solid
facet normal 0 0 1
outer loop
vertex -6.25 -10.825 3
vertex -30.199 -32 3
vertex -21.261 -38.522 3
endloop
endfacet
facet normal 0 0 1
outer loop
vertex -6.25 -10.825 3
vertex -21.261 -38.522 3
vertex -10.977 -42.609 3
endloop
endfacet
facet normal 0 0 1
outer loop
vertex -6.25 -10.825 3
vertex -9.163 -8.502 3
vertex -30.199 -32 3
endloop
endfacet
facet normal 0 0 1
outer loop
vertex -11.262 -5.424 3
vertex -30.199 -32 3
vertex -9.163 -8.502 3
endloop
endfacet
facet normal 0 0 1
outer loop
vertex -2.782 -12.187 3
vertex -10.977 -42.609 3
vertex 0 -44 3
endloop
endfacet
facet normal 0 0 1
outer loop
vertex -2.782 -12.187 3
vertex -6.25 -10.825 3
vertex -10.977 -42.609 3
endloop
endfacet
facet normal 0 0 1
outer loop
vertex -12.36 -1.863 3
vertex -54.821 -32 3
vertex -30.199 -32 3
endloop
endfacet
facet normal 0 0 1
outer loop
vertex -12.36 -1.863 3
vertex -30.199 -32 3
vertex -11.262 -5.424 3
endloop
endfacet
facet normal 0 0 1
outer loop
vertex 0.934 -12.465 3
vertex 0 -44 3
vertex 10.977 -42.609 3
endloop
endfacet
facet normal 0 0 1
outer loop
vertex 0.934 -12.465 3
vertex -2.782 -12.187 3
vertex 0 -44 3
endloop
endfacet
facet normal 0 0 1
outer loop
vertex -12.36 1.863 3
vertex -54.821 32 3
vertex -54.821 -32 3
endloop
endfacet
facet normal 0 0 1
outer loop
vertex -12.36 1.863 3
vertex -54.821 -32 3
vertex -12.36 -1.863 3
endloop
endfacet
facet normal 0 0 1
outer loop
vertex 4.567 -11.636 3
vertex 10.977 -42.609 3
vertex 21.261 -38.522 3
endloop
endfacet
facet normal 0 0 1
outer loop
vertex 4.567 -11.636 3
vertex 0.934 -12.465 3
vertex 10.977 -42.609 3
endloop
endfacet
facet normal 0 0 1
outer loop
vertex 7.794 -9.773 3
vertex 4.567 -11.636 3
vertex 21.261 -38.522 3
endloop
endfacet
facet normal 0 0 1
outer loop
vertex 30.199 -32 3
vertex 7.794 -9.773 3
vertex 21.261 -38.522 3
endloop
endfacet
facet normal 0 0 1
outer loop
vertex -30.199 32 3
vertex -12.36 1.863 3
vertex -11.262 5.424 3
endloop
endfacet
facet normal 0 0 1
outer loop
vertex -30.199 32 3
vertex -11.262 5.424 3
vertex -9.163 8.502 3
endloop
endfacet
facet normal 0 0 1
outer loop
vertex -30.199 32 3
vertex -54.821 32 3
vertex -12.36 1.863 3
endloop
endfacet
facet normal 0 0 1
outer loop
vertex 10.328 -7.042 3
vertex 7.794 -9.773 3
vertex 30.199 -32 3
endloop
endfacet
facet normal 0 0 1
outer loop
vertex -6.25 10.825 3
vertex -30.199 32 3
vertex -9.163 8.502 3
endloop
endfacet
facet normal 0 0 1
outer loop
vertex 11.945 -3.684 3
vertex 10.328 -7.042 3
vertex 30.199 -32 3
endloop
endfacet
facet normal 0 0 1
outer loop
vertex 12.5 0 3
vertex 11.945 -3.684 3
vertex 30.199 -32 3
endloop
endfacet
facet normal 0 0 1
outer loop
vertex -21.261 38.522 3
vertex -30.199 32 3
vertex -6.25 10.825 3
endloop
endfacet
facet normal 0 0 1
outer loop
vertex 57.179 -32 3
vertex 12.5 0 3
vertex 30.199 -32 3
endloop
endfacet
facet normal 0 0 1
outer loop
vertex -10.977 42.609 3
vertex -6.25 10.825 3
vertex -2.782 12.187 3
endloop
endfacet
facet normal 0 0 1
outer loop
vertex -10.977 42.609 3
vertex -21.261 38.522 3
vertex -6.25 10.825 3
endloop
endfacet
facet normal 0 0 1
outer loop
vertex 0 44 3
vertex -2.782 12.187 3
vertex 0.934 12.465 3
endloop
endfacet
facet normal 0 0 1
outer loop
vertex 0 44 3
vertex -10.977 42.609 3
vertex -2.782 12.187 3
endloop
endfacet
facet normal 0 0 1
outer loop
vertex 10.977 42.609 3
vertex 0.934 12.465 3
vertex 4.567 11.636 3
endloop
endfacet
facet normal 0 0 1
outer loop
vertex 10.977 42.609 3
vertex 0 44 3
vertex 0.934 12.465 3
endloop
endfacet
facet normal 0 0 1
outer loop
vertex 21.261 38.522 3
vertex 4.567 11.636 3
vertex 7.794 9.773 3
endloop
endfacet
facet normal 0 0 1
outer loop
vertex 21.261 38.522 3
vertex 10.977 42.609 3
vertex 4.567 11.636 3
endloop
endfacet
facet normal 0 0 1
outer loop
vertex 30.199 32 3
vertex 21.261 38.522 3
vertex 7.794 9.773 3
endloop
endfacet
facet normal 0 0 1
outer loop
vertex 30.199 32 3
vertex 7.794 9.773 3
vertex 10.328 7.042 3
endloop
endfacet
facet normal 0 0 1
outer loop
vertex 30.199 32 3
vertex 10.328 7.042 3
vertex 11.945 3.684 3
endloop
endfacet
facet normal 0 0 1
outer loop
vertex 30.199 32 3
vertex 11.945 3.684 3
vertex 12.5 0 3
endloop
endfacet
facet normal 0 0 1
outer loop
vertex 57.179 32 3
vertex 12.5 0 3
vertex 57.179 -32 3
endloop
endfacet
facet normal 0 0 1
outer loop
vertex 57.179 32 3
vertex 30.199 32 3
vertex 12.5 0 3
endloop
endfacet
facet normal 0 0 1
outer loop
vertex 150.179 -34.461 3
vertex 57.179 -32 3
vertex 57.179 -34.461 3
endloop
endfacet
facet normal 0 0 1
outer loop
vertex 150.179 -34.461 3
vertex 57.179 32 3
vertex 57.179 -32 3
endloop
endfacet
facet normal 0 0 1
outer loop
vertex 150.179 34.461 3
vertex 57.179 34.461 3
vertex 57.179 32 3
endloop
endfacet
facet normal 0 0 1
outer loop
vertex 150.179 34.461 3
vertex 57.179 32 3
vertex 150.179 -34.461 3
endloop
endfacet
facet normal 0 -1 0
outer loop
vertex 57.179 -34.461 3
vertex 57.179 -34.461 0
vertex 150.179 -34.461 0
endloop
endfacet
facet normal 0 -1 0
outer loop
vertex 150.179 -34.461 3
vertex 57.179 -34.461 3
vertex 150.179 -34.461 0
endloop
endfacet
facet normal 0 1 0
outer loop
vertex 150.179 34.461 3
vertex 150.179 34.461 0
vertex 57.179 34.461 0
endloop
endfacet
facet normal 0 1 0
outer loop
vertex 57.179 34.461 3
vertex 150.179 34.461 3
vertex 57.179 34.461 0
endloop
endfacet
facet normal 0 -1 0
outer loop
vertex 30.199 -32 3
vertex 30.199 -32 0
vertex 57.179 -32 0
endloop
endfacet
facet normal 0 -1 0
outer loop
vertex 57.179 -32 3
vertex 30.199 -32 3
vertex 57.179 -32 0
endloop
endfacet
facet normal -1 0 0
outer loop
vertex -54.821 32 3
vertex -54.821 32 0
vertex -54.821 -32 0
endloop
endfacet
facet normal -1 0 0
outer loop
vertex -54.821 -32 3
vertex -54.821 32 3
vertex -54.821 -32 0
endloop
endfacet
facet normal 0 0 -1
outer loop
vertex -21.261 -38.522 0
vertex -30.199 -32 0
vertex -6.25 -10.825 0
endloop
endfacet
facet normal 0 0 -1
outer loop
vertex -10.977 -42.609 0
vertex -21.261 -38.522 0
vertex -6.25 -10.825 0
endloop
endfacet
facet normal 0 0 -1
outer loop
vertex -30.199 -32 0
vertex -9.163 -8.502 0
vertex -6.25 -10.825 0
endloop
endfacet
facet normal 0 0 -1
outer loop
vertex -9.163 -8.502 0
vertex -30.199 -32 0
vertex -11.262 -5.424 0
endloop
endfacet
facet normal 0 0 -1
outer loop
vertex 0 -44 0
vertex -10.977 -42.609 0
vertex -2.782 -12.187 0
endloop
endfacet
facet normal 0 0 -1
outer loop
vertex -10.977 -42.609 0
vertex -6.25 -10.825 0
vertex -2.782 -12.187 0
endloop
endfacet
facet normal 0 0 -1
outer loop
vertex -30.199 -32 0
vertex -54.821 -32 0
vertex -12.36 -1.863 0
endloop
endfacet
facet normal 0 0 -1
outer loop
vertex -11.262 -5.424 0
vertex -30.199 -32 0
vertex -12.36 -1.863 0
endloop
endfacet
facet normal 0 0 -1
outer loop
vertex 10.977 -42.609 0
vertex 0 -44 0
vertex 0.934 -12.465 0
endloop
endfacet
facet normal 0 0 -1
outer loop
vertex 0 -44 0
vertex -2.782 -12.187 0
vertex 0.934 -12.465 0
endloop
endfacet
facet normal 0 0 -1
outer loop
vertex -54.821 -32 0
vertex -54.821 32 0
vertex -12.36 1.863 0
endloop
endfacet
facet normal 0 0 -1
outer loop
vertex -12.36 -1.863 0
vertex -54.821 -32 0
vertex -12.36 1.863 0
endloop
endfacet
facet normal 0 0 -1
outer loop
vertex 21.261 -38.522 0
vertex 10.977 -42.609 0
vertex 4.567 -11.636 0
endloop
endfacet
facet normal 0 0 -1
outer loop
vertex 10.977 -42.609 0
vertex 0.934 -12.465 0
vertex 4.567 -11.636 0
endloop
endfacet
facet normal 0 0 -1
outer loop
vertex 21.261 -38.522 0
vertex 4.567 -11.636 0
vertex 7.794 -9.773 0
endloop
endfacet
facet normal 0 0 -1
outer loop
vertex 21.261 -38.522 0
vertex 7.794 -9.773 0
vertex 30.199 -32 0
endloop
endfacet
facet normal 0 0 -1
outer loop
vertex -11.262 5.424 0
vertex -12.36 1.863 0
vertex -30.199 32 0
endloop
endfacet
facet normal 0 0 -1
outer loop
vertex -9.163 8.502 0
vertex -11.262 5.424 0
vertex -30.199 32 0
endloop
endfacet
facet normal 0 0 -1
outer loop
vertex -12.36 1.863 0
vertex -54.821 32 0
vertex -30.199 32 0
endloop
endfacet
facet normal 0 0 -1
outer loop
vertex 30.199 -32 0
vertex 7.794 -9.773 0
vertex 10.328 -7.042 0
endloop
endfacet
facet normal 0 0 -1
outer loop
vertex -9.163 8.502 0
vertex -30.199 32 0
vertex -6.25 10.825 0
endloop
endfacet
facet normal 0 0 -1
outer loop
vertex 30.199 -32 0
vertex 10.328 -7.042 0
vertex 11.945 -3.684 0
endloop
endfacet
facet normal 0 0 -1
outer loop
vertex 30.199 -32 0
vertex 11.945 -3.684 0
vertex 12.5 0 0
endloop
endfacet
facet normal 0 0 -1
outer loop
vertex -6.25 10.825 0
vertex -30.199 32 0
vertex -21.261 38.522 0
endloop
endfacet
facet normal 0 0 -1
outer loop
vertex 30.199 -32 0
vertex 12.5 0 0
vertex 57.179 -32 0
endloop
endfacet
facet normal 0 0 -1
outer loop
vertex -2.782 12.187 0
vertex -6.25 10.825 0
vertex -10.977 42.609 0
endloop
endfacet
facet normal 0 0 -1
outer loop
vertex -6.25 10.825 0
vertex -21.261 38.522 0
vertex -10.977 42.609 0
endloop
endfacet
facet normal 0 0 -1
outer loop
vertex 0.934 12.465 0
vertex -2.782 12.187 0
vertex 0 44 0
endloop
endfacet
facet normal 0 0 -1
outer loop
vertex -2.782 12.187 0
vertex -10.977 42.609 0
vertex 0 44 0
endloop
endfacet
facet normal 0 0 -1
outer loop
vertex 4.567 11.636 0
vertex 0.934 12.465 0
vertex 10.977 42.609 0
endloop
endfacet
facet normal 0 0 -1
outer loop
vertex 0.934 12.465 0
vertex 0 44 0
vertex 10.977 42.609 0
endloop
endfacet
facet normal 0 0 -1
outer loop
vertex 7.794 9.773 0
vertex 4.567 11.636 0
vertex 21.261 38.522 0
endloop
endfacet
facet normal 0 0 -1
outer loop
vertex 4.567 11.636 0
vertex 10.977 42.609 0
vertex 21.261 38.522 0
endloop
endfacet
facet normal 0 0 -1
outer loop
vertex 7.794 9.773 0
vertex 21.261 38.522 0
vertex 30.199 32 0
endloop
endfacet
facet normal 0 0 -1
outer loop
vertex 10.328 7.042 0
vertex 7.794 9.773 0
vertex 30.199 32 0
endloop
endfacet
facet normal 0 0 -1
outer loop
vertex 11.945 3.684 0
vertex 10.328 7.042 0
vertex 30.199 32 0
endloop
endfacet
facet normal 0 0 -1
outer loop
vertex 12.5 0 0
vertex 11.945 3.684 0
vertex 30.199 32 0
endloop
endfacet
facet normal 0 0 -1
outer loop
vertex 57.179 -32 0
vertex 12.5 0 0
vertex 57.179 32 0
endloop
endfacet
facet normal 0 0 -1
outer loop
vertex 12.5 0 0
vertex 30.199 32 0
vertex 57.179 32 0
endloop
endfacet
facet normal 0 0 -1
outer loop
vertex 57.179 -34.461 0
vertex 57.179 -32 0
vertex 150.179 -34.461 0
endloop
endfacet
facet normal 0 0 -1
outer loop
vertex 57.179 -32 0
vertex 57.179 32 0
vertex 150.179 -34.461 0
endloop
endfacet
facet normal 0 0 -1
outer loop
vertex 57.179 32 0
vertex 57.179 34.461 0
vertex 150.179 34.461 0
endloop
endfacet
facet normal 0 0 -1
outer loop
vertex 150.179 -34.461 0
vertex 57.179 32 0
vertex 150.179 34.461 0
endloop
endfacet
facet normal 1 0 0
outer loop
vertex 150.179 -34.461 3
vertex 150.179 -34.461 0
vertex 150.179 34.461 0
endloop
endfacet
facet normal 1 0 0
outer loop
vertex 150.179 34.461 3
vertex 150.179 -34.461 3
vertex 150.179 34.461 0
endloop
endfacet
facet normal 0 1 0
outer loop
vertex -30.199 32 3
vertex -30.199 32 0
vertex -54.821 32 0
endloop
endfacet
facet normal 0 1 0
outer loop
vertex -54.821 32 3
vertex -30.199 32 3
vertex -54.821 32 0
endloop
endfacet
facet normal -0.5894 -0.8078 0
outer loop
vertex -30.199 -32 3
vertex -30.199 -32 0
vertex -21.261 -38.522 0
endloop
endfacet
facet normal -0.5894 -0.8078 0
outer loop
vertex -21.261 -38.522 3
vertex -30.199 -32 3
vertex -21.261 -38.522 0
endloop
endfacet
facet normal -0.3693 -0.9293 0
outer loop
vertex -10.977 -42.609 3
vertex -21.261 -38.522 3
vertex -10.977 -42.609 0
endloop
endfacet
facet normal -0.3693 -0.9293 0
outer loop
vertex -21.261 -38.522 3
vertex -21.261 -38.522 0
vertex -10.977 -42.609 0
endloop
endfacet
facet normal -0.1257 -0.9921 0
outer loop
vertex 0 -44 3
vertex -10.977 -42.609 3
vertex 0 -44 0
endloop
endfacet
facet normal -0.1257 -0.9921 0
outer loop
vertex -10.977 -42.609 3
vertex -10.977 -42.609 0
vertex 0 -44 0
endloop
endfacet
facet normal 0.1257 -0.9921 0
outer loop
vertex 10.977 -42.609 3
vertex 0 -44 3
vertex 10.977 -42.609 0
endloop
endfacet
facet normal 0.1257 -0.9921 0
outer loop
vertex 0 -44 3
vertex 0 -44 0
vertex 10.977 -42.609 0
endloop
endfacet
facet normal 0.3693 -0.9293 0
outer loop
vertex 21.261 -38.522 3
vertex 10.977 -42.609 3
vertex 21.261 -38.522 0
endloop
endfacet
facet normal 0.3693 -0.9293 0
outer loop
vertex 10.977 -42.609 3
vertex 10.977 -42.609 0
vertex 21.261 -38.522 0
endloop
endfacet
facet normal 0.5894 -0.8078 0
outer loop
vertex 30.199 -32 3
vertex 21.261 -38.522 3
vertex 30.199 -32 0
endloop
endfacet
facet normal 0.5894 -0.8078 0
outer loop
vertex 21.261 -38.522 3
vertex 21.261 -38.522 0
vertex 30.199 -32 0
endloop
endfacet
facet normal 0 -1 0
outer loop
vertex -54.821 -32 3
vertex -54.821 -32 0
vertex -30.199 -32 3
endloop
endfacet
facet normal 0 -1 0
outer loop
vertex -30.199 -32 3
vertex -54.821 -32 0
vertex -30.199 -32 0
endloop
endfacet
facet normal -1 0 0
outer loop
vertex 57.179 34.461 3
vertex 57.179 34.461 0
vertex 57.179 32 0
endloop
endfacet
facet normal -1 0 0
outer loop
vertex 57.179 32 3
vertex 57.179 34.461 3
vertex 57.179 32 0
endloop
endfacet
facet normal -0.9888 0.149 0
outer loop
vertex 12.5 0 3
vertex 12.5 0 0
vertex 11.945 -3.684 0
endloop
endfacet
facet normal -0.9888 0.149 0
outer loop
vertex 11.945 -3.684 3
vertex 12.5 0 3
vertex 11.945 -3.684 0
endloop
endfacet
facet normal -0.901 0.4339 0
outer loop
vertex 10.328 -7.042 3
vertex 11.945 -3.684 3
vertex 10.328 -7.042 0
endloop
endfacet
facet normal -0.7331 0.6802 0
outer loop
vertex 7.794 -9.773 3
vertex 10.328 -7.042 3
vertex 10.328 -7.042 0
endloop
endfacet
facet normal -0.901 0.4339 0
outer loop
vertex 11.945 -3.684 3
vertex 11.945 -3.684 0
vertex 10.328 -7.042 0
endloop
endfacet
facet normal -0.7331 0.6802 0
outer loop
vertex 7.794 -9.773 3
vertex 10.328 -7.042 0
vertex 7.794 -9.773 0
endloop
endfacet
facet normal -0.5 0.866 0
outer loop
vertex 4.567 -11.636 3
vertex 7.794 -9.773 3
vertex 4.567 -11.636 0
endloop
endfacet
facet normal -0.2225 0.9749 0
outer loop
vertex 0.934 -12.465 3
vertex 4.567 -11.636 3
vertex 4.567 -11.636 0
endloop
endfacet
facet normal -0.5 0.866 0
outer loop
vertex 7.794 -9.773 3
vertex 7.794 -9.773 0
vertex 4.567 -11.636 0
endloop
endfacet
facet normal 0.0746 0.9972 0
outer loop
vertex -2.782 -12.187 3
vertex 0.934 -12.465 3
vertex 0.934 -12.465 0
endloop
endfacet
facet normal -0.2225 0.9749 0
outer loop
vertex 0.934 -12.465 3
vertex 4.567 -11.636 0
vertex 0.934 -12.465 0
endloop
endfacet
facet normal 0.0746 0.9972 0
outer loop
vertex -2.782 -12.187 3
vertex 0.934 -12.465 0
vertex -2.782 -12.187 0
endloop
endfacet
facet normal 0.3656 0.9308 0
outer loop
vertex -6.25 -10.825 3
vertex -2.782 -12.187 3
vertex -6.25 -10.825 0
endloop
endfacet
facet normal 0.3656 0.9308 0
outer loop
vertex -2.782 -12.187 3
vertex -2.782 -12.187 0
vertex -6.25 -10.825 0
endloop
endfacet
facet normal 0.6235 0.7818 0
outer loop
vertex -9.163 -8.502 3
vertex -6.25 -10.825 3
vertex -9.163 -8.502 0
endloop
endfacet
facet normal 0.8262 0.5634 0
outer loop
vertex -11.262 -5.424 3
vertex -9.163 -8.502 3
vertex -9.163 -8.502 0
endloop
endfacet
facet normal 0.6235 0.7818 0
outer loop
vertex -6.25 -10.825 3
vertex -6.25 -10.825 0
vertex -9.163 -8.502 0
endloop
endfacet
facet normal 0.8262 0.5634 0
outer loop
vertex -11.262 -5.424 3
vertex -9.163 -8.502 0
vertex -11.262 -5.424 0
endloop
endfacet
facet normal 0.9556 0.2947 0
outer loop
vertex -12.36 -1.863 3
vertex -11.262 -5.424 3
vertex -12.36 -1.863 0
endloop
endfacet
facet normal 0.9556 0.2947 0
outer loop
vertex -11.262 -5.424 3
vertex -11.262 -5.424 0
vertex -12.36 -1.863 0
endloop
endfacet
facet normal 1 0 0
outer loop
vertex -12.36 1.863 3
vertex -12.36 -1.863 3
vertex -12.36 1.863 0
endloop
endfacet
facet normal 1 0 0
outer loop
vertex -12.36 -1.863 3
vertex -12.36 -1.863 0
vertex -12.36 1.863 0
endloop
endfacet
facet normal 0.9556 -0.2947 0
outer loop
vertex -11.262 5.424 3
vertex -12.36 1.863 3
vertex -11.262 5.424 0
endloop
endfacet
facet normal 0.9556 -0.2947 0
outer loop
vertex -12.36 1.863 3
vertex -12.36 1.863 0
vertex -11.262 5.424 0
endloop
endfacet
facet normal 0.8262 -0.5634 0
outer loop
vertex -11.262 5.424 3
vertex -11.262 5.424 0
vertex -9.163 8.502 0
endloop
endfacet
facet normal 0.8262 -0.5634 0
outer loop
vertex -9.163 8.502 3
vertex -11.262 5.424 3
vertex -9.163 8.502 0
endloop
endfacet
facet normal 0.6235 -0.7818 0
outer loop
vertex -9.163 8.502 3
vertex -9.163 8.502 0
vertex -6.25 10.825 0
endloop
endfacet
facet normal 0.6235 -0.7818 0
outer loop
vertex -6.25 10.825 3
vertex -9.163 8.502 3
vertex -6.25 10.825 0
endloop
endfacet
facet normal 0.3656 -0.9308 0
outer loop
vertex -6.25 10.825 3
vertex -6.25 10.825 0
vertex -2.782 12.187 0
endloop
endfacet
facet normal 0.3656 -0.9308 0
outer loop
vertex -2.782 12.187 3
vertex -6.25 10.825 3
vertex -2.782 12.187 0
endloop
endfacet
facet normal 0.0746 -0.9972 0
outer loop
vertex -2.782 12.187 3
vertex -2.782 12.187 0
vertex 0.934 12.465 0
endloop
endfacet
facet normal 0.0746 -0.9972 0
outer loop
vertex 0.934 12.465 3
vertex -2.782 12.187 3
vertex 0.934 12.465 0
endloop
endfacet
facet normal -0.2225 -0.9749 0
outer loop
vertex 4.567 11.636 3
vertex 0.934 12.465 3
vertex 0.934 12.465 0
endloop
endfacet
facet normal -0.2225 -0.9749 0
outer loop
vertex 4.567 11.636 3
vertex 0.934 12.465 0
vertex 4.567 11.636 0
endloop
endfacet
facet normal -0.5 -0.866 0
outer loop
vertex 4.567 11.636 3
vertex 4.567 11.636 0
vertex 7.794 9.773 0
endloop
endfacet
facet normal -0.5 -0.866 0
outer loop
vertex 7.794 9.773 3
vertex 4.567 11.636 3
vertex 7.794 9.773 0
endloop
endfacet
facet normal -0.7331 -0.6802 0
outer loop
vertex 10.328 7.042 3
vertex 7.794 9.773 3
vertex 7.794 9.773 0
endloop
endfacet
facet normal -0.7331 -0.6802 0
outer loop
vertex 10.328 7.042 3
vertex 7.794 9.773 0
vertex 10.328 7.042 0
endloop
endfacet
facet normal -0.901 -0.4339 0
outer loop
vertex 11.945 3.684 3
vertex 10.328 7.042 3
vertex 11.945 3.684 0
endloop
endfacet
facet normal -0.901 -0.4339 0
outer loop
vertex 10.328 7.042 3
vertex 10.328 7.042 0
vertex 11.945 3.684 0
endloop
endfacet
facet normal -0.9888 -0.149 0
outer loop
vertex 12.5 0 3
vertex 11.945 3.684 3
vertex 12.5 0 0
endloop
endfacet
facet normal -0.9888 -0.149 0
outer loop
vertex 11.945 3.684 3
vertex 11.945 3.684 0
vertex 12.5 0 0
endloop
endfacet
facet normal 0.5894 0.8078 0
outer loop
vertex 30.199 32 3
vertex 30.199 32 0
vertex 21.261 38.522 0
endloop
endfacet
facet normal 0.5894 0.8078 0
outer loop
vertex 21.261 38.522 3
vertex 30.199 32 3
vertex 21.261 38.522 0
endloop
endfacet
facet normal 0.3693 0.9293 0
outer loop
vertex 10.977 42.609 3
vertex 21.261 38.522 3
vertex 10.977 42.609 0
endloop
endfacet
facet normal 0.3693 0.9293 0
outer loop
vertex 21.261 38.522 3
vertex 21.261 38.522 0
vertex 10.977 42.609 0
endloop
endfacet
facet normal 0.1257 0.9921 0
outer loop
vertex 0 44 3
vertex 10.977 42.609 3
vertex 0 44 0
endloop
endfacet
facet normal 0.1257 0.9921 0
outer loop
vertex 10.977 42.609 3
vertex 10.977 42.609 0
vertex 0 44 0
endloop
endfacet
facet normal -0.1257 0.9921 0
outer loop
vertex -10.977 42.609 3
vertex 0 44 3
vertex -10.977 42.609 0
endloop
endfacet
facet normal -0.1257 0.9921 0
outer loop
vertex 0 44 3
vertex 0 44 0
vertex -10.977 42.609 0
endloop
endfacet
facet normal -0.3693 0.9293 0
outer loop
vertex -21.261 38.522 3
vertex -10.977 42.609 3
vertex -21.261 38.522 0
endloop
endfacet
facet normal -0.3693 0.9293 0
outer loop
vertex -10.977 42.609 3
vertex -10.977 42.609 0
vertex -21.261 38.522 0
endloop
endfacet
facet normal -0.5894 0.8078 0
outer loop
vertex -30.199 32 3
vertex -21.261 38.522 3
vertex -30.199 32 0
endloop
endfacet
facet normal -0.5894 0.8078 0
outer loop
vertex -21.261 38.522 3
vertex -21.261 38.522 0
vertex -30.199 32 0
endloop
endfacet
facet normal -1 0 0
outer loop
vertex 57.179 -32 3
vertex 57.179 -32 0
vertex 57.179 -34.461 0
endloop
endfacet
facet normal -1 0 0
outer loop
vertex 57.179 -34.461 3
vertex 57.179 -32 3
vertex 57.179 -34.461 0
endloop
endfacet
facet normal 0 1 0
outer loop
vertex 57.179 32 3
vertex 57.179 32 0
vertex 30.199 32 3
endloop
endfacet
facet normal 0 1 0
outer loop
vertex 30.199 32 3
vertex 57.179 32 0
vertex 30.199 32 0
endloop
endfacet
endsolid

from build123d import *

# Parameters (mm, degrees)
F1_DEPTH = 3


with BuildPart() as f1:
    # F0 (on Top) → F1 (new body)
    with BuildSketch(Plane.XY):
        with BuildLine():
            ThreePointArc((30.199338, 32), (0, 44), (-30.199338, 32))
            Line((-30.199338, 32), (-54.820662, 32))
            Line((-54.820662, 32), (-54.820662, 0))
            Line((-54.820662, 0), (-54.820662, -32))
            Line((-54.820662, -32), (-30.199338, -32))
            ThreePointArc((-30.199338, -32), (0, -44), (30.199338, -32))
            Line((30.199338, -32), (57.179338, -32))
            Line((57.179338, -32), (57.179338, -34.461271))
            Line((57.179338, -34.461271), (150.179338, -34.461271))
            Line((150.179338, -34.461271), (150.179338, 0))
            Line((150.179338, 0), (150.179338, 34.461271))
            Line((150.179338, 34.461271), (57.179338, 34.461271))
            Line((57.179338, 34.461271), (57.179338, 32))
            Line((57.179338, 32), (30.199338, 32))
        make_face()
        with BuildLine():
            ThreePointArc((-12.5, 0), (0, 12.5), (12.5, 0))
            ThreePointArc((12.5, 0), (0, -12.5), (-12.5, 0))
        make_face(mode=Mode.SUBTRACT)
    extrude(amount=F1_DEPTH)


solid = f1.part
